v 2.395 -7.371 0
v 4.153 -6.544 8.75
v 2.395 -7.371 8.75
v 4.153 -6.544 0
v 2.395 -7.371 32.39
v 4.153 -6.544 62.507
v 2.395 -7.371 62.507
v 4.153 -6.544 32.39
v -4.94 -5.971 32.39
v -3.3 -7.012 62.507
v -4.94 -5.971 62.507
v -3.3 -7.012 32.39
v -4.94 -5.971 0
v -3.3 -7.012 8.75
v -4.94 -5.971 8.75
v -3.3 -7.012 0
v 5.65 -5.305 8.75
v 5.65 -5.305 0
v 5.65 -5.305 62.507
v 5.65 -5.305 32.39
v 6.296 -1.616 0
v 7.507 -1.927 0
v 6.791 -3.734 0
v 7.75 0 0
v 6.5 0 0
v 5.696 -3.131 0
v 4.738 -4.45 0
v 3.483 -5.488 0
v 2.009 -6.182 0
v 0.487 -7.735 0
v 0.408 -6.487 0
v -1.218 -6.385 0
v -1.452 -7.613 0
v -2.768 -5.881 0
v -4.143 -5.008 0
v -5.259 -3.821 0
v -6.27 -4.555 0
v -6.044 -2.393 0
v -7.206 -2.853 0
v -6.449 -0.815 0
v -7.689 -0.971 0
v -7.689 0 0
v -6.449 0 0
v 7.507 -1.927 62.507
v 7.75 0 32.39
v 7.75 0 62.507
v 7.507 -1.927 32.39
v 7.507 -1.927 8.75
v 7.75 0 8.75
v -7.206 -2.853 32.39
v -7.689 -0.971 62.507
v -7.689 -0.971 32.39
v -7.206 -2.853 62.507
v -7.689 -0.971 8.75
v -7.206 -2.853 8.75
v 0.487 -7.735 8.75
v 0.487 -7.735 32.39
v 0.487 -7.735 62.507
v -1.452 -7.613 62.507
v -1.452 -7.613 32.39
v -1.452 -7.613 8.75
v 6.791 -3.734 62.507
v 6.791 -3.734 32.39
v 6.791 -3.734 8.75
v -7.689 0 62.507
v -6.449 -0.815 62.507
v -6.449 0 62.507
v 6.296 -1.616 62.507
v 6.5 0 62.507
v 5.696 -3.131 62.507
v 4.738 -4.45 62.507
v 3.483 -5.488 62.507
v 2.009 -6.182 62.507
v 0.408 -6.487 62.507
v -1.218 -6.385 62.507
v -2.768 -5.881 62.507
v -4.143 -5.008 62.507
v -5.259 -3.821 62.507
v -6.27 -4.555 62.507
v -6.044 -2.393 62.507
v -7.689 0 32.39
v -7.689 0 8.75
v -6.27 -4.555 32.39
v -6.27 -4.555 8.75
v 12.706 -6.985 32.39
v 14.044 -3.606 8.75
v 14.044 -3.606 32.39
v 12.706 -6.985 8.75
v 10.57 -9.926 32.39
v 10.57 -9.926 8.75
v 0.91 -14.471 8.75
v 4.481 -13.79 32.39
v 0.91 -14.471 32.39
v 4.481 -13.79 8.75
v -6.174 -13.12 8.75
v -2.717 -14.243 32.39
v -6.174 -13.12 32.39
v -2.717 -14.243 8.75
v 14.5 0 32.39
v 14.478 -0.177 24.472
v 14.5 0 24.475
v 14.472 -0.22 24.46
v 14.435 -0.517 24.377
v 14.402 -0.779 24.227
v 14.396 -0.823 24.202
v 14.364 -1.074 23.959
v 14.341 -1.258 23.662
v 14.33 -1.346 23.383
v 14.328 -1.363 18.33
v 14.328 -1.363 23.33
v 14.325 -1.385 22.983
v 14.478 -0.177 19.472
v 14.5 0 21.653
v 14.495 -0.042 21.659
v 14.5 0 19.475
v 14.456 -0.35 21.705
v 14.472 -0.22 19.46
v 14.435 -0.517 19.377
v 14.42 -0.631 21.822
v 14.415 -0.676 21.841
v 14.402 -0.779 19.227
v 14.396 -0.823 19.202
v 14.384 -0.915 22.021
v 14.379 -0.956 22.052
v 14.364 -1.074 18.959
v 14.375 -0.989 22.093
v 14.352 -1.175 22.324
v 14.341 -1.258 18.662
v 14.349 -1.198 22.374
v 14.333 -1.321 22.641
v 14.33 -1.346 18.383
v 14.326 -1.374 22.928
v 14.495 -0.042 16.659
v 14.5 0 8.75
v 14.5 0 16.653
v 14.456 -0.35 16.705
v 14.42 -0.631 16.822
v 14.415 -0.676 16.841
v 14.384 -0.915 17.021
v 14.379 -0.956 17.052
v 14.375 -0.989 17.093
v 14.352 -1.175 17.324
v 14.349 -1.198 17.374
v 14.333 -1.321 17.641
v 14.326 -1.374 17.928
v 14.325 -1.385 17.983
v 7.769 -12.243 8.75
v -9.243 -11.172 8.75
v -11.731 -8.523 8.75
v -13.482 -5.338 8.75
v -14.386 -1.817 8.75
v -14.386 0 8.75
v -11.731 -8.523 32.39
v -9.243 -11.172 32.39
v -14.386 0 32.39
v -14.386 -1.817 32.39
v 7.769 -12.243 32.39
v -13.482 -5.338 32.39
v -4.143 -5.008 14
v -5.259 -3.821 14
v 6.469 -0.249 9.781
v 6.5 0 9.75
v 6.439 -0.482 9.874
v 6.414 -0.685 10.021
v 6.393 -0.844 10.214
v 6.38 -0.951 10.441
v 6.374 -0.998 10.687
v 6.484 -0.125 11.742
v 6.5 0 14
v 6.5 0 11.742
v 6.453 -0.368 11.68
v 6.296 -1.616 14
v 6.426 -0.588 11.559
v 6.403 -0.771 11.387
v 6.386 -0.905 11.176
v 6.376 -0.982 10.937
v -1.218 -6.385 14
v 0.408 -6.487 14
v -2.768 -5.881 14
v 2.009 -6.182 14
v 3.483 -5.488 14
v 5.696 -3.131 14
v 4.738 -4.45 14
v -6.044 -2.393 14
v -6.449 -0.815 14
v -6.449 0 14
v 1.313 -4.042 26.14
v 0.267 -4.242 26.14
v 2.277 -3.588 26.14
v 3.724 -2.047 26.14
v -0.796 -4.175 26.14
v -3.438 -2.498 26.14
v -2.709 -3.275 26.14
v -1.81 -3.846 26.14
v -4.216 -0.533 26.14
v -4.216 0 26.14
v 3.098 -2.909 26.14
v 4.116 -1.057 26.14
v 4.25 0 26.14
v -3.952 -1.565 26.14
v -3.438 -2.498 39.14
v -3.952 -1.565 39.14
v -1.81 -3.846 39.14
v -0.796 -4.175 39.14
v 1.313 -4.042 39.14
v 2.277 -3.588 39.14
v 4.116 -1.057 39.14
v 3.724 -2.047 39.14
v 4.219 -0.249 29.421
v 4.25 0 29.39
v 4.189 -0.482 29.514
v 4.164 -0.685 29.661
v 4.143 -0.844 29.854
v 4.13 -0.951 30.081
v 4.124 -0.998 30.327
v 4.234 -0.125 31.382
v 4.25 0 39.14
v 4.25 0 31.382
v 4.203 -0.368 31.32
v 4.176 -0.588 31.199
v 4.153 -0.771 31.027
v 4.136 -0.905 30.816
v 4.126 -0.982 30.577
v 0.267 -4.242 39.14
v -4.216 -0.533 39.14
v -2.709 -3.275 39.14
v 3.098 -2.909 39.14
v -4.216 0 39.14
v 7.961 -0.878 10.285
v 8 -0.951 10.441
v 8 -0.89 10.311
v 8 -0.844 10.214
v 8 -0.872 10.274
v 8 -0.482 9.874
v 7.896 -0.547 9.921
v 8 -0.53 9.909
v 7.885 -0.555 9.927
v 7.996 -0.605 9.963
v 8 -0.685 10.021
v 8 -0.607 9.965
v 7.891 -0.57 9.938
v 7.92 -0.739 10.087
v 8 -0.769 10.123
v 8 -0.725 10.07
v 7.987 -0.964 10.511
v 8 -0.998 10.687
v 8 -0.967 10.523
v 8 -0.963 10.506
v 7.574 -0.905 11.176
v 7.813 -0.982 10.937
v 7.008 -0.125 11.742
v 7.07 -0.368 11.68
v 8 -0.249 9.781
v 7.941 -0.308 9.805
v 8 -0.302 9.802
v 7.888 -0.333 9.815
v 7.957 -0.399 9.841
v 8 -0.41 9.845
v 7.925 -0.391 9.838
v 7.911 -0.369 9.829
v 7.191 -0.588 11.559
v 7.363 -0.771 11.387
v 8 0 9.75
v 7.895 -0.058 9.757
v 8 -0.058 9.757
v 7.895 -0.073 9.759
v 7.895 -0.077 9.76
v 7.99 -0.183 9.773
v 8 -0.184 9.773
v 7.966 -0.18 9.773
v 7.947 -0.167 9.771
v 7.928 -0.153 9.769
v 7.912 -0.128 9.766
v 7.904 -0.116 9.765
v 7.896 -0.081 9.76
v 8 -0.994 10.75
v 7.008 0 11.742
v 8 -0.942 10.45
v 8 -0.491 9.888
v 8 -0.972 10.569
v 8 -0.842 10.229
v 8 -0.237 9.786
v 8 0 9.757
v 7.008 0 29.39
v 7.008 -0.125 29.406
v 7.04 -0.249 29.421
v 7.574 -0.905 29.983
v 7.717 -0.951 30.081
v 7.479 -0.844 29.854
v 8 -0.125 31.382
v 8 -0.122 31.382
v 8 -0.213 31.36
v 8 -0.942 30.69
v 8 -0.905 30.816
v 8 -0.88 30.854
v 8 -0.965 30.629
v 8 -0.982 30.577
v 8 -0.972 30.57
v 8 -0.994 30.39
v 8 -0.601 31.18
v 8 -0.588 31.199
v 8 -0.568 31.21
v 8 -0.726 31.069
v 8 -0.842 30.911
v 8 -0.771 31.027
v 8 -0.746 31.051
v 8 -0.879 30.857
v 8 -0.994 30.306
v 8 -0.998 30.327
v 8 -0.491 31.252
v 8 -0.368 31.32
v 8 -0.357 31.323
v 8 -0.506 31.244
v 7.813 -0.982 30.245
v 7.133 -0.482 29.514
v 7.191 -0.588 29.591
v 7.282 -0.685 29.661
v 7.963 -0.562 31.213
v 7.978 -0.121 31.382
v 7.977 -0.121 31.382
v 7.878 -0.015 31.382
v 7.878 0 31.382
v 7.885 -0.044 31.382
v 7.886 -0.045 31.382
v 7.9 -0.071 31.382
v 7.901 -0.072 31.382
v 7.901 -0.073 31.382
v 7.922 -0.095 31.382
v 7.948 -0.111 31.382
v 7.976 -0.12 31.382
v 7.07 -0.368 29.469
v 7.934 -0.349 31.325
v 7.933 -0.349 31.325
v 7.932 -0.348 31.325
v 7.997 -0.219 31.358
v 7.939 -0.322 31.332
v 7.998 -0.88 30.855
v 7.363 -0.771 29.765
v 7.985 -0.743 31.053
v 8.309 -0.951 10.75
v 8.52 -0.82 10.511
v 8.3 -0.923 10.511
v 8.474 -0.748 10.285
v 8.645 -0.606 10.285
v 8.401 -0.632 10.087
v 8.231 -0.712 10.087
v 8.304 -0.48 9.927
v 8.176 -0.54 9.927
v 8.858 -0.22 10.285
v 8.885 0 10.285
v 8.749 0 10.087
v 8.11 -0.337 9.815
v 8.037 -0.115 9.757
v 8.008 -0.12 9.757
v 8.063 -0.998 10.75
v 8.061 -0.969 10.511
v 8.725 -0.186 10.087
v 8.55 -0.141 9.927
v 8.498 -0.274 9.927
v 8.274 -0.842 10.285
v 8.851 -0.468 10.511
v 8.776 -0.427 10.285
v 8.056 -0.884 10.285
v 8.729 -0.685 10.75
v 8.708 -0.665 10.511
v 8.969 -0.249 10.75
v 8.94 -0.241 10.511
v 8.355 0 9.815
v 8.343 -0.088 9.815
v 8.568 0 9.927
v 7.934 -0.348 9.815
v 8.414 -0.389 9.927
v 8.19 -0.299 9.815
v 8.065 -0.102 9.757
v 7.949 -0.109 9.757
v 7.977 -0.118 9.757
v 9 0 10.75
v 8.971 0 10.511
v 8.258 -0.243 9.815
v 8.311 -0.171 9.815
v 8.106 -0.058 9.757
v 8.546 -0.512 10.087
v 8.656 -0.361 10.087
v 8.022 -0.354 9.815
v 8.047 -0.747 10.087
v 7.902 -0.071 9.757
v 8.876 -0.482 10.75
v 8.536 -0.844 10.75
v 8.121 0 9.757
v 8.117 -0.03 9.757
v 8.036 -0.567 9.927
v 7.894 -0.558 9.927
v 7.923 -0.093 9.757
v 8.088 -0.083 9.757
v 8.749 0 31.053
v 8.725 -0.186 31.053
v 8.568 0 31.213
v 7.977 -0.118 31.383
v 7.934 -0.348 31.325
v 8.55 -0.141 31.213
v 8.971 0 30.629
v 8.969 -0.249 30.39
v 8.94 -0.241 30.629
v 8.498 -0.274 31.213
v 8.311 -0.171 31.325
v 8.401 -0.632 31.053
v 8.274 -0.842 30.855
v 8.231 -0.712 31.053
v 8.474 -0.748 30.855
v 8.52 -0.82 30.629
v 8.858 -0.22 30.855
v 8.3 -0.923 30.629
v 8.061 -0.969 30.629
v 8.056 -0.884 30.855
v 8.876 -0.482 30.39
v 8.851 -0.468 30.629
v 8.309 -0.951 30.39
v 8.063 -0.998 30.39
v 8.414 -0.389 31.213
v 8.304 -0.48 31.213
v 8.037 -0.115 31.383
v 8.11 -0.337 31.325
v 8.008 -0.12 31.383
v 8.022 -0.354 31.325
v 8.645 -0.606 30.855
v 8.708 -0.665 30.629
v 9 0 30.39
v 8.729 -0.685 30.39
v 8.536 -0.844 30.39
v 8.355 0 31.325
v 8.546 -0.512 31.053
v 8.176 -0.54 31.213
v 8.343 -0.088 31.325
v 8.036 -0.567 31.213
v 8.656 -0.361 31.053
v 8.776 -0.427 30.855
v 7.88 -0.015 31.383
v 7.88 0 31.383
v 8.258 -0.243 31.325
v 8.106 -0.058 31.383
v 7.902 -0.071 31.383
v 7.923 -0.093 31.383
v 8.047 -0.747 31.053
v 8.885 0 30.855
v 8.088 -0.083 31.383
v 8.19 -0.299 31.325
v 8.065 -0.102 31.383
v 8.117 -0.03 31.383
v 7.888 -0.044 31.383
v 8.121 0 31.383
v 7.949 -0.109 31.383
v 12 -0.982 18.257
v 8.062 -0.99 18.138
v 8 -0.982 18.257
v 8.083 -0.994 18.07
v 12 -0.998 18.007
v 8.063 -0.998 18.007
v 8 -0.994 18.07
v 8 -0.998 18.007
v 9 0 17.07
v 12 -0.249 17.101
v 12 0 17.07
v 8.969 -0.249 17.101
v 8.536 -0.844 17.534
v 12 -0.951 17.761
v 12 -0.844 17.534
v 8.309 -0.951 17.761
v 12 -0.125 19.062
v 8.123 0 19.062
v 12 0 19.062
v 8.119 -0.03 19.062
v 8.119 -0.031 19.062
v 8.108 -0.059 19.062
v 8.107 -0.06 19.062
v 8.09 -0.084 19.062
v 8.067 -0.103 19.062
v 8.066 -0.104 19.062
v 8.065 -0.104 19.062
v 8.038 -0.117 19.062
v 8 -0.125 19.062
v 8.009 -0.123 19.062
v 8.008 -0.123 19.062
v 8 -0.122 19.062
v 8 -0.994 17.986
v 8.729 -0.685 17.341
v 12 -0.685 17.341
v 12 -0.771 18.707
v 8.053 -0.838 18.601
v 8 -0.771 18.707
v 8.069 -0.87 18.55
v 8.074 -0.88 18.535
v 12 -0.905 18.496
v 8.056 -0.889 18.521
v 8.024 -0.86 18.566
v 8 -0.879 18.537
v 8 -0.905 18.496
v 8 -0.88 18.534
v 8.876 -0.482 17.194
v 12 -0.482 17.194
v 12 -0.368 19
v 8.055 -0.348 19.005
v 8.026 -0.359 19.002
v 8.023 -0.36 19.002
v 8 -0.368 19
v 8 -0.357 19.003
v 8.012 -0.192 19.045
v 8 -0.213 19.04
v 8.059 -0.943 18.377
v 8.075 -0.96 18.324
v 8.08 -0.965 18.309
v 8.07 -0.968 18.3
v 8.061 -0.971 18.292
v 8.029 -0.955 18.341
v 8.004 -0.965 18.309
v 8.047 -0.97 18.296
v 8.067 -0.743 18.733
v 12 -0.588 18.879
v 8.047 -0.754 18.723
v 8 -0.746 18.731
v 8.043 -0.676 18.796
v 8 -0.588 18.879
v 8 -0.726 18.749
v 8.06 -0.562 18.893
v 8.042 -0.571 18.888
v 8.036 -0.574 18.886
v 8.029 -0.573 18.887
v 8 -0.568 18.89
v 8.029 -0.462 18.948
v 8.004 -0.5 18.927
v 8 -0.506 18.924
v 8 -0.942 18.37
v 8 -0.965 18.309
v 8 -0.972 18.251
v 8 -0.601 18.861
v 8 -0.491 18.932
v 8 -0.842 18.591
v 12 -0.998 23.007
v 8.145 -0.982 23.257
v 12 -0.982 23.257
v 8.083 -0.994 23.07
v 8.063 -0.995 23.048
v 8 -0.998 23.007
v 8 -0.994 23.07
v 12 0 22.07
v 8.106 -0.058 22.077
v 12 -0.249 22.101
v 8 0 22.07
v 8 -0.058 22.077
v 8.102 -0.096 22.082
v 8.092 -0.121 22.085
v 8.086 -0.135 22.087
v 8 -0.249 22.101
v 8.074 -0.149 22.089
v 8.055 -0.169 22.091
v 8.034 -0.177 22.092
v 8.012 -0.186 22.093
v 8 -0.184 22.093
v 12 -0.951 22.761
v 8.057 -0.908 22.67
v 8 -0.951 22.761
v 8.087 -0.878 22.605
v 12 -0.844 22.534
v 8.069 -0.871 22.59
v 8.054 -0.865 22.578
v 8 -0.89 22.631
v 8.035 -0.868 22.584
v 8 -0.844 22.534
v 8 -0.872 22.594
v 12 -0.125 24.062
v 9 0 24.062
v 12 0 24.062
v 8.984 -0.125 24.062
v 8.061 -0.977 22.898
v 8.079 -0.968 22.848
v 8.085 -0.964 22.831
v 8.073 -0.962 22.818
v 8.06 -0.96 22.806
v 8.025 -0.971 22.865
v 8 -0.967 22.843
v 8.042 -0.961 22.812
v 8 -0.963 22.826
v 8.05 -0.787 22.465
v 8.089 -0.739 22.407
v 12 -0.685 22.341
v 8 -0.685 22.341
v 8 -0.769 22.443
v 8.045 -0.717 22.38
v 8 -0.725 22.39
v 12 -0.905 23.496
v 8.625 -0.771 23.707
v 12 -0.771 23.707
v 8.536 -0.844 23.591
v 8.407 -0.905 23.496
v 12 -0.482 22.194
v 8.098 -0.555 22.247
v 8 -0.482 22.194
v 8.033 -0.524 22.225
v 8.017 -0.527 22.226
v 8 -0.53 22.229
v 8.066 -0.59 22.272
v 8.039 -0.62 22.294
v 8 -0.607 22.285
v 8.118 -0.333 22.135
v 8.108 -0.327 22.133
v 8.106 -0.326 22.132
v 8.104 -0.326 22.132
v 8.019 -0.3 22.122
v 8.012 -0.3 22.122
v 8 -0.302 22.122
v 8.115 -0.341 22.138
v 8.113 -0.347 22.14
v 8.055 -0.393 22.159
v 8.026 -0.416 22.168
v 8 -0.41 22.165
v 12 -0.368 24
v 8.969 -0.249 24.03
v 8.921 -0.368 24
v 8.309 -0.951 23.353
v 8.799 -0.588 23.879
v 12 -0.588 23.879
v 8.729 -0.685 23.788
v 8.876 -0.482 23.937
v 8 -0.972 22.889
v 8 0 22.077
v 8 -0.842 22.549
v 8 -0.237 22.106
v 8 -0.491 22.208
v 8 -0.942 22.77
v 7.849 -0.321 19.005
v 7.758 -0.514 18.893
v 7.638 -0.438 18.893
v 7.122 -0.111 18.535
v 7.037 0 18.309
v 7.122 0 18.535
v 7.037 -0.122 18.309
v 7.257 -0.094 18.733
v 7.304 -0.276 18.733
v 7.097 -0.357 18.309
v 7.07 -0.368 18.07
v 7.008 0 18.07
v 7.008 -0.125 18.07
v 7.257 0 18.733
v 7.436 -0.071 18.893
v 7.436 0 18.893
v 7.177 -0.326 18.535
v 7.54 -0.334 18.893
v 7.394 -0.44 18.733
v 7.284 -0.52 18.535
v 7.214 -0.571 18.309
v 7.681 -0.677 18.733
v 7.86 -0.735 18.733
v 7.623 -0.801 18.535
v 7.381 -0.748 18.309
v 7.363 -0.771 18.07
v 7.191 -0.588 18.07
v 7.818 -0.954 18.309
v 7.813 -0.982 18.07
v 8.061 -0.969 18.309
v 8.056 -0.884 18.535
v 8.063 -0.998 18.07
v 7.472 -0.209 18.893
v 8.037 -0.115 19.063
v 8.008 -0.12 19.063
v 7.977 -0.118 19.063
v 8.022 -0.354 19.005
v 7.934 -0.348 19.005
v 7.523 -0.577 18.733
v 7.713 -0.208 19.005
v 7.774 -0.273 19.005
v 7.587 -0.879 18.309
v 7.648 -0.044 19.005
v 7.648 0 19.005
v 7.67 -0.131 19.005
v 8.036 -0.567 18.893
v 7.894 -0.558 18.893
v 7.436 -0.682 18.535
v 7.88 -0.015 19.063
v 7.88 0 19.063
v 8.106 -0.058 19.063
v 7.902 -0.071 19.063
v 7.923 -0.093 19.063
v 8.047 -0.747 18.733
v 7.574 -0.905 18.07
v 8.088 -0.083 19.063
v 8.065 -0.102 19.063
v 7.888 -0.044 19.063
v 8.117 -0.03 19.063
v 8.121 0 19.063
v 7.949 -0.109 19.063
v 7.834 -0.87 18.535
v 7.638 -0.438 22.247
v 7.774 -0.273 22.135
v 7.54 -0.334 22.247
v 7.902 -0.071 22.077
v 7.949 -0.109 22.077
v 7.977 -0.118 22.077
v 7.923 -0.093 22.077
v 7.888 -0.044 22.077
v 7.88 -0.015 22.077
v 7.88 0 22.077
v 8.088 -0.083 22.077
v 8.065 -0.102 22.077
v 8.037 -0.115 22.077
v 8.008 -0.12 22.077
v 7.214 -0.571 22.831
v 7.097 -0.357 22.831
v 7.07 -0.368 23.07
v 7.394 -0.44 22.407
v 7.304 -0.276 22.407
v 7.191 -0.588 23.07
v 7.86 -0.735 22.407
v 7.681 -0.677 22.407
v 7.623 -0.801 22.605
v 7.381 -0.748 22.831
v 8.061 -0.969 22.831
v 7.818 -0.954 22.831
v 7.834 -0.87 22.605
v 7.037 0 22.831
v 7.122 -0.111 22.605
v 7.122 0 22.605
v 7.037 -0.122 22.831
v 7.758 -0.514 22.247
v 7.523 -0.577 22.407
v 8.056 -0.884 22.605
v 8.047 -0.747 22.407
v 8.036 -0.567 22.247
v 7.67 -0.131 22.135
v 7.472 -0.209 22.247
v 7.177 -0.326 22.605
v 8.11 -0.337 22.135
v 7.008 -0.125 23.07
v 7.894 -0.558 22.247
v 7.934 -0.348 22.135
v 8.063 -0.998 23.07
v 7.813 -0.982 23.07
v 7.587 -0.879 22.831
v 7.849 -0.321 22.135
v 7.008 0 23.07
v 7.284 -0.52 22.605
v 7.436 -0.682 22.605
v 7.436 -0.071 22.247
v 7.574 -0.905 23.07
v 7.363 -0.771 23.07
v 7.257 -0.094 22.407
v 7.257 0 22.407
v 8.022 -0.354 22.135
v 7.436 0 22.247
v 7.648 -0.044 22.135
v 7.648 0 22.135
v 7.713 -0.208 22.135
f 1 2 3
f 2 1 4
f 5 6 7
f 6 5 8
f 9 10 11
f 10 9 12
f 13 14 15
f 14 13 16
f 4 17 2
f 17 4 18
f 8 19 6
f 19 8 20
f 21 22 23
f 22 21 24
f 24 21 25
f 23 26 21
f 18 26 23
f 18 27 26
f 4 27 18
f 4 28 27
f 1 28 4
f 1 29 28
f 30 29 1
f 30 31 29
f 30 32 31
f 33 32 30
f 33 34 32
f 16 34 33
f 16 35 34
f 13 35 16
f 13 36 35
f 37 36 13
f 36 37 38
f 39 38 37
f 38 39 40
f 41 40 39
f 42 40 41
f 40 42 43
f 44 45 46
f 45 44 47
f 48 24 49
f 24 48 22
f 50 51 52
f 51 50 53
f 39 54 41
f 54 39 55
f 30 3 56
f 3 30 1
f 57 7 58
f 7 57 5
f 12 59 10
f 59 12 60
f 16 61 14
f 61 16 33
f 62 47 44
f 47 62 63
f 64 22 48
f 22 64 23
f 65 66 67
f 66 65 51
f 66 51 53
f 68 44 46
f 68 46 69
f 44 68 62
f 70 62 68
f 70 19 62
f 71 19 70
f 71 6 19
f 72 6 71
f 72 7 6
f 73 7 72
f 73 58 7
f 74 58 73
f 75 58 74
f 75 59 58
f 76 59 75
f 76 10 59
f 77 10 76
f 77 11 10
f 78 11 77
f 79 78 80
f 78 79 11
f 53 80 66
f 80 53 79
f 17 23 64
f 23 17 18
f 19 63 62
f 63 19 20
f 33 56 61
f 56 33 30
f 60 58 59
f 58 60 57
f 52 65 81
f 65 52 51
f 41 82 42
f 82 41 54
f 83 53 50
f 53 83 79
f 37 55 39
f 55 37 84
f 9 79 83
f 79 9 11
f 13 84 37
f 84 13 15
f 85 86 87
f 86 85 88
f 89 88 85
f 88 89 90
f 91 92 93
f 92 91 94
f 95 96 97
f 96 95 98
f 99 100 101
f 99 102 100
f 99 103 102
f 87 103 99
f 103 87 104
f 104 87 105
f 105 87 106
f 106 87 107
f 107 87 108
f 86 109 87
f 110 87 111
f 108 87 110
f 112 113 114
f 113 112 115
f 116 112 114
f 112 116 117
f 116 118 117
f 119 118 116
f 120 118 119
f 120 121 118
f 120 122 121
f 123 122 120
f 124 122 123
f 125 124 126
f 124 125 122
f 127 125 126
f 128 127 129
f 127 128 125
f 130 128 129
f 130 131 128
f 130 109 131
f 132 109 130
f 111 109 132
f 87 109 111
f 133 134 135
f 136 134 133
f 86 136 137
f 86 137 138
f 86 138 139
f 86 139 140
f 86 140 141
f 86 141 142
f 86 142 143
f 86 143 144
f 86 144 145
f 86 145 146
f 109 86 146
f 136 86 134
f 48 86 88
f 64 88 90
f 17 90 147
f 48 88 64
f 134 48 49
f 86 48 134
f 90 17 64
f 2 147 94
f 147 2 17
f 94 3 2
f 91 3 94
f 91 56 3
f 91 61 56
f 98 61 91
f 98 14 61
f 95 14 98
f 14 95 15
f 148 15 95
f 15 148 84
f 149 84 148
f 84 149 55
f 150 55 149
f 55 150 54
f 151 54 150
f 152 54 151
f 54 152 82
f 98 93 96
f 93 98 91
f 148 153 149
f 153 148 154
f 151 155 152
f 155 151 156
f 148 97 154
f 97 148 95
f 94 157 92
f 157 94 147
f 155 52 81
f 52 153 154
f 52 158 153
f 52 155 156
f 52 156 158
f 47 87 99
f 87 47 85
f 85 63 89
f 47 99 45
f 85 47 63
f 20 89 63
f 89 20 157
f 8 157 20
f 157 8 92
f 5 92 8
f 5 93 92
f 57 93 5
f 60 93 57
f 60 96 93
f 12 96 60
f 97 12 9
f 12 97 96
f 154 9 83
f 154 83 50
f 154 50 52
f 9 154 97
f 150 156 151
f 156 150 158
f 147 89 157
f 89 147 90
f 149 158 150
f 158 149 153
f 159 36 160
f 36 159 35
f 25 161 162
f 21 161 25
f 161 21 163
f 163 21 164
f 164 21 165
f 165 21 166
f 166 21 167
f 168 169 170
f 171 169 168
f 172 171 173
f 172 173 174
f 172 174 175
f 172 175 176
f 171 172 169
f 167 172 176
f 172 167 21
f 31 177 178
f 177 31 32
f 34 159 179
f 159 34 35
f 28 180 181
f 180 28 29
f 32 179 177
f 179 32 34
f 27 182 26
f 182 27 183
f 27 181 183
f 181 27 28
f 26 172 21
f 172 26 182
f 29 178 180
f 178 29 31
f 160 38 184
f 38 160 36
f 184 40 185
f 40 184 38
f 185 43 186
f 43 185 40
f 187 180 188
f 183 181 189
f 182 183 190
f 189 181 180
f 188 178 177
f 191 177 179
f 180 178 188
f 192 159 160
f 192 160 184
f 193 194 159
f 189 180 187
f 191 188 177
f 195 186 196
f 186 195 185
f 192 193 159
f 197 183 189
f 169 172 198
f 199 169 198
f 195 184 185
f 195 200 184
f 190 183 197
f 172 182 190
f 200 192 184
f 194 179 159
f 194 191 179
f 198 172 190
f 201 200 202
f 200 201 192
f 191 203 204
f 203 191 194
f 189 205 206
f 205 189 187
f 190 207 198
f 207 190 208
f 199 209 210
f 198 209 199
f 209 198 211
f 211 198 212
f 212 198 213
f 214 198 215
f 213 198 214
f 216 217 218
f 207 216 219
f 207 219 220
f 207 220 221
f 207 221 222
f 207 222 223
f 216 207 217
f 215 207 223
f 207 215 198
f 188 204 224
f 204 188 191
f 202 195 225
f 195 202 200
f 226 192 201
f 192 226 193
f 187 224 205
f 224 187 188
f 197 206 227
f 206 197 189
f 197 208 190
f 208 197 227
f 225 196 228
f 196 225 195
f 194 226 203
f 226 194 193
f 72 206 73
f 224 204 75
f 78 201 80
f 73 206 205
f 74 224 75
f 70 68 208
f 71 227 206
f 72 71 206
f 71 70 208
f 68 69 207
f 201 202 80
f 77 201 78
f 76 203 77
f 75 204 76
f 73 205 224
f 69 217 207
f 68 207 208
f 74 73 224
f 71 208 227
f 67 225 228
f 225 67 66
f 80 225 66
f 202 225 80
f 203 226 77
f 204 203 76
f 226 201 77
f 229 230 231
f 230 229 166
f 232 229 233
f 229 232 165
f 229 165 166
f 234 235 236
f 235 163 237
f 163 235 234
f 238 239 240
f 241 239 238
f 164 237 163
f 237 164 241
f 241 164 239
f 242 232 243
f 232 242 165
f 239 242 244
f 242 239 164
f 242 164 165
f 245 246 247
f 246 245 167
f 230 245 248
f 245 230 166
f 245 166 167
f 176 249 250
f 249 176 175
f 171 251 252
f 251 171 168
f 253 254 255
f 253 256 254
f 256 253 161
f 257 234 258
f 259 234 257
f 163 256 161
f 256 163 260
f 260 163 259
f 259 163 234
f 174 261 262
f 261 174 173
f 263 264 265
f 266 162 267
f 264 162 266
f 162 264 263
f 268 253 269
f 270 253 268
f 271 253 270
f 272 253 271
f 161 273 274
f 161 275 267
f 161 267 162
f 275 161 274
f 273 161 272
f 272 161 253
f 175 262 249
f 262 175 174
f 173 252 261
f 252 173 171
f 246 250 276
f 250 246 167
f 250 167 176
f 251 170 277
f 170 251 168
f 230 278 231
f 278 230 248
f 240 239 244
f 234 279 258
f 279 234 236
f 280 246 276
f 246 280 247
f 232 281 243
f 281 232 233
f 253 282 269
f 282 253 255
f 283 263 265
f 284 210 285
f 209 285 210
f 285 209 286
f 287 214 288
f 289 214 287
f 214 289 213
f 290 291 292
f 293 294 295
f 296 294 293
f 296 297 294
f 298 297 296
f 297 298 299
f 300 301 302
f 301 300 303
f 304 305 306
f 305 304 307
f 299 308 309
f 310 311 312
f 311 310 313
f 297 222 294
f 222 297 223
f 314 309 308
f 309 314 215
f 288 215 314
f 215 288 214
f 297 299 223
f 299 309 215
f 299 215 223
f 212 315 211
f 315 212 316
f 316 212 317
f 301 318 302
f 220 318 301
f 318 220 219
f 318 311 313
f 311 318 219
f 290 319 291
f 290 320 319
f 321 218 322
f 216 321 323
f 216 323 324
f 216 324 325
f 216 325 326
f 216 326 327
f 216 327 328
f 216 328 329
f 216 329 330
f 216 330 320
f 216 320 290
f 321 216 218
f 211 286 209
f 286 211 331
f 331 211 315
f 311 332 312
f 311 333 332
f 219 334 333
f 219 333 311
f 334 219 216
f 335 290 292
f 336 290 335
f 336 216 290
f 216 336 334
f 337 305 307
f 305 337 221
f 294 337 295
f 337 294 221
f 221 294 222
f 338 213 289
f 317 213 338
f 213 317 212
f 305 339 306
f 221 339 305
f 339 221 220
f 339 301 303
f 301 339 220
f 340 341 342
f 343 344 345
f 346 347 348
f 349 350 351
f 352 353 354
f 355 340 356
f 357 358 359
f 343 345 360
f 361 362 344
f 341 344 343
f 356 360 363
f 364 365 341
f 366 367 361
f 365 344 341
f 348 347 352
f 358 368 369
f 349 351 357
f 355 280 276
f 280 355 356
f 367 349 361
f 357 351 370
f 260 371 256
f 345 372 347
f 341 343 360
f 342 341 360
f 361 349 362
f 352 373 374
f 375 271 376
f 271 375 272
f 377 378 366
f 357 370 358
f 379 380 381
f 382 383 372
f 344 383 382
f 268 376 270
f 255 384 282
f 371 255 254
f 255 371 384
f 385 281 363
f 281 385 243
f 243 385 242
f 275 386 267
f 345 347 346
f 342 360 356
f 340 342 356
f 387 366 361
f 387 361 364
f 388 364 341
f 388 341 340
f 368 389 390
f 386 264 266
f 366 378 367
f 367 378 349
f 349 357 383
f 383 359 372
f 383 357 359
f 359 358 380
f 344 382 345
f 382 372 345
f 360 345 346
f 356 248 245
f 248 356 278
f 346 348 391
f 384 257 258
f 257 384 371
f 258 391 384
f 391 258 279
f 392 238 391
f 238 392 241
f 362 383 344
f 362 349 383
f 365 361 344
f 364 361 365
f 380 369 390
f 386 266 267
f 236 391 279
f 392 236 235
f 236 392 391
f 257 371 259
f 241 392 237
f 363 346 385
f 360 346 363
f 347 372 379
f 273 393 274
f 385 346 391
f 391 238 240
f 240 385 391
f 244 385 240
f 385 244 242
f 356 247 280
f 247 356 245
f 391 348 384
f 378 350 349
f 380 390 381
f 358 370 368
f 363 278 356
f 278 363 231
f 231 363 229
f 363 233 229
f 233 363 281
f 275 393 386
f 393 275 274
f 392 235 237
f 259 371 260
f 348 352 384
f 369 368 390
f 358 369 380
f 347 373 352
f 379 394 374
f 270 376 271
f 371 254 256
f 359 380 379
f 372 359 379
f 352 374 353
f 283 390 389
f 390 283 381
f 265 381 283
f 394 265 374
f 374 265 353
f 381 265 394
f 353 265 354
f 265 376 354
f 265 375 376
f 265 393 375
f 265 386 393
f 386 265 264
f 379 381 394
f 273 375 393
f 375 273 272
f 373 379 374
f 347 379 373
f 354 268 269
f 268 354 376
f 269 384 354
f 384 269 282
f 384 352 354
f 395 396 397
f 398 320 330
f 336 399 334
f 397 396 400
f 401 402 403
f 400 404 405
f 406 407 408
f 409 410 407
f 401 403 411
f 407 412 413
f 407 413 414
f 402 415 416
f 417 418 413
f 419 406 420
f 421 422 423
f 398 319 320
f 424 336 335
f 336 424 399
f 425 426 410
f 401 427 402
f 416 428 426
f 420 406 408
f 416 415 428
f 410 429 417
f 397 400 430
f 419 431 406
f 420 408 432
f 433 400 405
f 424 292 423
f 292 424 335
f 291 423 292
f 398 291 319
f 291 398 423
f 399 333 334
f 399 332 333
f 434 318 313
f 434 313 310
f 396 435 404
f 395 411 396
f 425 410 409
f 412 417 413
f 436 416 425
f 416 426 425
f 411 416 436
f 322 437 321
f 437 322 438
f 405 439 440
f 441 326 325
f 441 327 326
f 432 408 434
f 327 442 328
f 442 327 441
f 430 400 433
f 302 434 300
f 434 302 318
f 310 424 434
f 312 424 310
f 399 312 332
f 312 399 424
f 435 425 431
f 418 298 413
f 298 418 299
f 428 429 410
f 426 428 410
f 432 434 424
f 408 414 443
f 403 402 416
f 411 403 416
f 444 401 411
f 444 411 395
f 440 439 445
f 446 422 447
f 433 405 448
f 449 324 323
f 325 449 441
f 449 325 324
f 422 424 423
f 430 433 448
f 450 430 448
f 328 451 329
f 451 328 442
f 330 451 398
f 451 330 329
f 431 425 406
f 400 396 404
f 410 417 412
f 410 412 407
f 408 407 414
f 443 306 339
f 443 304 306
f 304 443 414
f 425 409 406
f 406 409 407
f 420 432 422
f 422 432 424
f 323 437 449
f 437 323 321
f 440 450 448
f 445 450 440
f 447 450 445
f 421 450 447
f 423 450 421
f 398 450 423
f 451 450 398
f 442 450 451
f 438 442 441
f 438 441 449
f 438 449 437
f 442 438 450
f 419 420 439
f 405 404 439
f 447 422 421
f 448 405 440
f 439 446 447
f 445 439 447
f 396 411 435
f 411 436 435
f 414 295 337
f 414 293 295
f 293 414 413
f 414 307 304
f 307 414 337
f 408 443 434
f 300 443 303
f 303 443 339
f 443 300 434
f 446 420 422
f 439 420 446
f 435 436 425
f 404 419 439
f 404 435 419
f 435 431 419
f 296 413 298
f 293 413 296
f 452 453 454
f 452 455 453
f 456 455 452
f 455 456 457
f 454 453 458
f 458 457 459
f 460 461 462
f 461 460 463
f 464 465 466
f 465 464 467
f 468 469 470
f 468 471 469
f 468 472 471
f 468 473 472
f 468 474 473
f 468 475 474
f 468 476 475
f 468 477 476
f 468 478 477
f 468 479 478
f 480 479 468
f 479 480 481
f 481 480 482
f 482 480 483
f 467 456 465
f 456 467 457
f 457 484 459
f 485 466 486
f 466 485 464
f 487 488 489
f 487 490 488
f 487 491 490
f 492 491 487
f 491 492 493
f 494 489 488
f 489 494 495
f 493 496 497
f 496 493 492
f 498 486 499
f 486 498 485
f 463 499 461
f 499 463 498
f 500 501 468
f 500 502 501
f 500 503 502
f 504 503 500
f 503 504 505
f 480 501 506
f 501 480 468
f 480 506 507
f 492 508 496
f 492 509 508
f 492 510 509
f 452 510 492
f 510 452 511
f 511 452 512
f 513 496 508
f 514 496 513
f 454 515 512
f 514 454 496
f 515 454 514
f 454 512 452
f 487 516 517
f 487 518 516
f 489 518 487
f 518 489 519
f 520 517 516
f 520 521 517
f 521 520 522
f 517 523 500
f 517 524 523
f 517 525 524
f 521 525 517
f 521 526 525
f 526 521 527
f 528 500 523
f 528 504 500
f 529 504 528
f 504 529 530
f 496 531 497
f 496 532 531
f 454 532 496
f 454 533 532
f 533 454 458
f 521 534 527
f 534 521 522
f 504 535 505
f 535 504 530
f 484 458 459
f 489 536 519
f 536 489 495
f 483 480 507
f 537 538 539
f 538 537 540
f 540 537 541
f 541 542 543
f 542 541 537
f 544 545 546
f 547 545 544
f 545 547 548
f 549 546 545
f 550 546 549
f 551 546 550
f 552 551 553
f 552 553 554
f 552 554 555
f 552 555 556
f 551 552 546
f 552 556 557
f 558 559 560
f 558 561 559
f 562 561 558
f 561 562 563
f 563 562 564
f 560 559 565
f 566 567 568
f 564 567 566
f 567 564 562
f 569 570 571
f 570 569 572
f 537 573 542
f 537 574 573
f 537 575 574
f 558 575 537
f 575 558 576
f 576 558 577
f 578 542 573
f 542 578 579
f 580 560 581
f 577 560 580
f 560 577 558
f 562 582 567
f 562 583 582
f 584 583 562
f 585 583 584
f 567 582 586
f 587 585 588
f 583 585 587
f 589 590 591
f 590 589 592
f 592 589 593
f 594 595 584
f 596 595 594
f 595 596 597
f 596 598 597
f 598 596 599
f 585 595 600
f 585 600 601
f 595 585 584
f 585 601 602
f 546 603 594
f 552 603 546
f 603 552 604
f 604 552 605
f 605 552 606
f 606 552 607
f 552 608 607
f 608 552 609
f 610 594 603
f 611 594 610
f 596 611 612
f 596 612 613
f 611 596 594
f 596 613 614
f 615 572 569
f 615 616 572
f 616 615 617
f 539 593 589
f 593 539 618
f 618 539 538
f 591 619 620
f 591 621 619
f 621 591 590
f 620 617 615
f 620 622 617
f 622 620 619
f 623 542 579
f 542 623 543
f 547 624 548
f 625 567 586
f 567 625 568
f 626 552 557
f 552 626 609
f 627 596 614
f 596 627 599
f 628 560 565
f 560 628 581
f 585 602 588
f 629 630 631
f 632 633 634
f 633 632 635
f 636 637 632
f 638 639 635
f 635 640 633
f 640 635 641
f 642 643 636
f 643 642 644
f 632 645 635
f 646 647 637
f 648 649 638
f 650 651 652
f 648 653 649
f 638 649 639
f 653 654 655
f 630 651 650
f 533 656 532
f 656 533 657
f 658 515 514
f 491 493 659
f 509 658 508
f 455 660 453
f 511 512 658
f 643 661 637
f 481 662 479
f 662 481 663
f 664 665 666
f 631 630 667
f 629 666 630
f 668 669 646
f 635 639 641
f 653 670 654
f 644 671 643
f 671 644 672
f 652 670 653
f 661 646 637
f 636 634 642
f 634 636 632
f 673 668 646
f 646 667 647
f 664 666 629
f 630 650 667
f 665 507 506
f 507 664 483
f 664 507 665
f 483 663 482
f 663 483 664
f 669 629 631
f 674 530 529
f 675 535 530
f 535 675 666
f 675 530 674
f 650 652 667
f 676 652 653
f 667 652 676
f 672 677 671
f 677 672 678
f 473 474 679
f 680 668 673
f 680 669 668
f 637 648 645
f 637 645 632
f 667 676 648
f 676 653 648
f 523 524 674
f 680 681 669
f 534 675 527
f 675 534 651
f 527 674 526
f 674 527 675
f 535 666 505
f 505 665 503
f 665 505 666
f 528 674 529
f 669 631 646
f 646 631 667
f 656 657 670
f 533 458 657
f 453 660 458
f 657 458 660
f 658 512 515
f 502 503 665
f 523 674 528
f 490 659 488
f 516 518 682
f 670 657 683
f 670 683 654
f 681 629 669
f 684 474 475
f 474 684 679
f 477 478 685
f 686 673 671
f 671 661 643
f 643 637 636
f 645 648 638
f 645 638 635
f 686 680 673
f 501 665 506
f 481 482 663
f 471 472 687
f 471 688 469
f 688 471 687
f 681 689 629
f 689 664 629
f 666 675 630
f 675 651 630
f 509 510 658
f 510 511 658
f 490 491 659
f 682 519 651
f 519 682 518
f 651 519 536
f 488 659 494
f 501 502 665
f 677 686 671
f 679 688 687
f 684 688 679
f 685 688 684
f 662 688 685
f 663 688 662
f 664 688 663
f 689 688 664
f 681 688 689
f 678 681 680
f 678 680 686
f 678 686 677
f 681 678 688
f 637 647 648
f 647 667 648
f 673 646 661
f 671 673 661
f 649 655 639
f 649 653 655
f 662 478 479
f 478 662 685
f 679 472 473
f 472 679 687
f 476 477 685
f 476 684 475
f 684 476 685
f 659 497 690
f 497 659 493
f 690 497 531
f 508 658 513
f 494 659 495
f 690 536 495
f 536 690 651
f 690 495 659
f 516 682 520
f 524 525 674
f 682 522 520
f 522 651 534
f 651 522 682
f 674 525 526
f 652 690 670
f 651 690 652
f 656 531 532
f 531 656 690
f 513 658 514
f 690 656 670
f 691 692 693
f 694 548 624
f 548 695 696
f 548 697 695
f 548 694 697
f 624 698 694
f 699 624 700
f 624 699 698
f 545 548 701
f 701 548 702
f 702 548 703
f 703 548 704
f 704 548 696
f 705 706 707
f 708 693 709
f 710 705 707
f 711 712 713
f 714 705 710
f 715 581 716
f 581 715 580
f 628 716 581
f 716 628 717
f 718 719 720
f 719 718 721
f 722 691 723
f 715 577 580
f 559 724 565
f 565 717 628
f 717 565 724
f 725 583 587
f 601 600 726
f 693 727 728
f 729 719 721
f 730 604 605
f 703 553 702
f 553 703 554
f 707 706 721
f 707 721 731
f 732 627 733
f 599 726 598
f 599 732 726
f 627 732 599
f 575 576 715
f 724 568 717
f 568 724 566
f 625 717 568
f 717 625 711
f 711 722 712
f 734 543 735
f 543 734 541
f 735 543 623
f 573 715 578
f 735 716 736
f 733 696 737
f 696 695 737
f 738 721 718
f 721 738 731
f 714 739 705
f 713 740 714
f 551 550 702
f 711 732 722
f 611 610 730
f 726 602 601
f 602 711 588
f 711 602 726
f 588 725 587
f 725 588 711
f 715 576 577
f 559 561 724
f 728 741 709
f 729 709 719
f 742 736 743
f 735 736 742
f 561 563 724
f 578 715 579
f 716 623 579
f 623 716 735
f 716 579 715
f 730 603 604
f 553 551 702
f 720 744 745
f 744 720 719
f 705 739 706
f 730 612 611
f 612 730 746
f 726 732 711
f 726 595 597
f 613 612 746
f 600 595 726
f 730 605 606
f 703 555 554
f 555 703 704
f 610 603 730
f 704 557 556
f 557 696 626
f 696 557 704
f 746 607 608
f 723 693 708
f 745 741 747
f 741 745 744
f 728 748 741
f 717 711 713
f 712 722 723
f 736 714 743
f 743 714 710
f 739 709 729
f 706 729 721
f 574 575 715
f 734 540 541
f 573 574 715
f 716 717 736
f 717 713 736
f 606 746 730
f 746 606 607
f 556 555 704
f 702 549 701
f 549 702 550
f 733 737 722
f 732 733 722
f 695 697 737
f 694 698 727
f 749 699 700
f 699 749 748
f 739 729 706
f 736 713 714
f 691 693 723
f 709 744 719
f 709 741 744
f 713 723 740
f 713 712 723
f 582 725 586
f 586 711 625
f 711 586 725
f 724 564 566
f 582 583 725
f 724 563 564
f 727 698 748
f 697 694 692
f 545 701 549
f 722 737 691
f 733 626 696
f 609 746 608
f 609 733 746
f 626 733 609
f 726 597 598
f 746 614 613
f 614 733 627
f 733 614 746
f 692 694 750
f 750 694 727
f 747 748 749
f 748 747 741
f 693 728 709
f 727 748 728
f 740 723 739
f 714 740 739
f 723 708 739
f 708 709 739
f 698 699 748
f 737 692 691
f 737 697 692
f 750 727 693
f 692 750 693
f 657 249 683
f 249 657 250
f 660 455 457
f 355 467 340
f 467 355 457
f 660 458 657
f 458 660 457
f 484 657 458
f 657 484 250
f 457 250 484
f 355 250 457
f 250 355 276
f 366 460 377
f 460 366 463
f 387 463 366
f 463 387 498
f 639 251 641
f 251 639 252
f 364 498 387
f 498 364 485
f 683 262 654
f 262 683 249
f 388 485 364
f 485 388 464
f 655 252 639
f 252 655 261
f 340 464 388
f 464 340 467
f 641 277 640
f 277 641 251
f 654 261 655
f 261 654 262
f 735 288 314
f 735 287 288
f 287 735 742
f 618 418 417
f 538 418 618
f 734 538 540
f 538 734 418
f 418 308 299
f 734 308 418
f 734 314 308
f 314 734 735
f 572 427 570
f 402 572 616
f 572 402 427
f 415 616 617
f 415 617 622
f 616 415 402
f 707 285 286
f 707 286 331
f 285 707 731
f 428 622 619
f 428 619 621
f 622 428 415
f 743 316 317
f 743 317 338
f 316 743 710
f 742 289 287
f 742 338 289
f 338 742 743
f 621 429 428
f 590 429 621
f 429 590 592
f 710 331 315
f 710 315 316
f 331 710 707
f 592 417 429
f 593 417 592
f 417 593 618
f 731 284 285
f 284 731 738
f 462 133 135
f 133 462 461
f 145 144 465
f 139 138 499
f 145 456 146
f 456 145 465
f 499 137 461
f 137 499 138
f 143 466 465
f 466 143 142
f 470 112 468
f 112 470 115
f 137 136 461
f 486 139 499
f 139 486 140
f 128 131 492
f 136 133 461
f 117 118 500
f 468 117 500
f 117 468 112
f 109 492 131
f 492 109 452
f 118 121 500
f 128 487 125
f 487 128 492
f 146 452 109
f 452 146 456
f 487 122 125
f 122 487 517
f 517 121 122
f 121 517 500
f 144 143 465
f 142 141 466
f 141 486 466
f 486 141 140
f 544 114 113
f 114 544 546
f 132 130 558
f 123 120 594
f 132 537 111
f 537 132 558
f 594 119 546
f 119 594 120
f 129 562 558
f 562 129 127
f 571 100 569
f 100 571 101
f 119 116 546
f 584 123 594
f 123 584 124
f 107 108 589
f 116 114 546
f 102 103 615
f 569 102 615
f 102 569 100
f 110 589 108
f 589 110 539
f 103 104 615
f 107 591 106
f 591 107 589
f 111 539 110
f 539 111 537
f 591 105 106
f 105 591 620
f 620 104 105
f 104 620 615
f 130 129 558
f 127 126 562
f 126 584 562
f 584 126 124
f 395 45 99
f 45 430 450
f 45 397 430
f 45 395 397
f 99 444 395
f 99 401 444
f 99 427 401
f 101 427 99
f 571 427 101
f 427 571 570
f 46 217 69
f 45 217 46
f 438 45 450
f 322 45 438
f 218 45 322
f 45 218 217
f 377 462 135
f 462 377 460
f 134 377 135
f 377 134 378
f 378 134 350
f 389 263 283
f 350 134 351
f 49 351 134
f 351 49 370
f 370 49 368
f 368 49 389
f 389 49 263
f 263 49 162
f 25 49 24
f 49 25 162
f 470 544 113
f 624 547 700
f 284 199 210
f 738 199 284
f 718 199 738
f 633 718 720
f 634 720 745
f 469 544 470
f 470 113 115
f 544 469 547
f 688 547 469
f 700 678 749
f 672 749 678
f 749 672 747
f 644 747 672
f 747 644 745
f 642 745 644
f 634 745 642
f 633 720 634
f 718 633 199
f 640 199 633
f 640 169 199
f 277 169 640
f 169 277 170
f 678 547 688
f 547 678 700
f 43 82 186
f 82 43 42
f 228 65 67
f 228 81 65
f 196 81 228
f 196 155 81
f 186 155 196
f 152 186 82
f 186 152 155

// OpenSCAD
// this file by maehw/diy-beatmungsgeraet is licensed under the
// GNU General Public License v3.0

// disclaimer: this design is very experimental!

$fn = 25; // increase number to improve result (and to slow down rendering)

D = 13;
Li = 14; // Li >= D; length of the inlet
d = 8.5;
a1 = 21; // 21 +-1 degree
a2 = 11; // 7..15 degree
z = D/4;
x = d/2;

p = 1; // pipe system diameter
t = 2; // main flow tube system thickness (take care to include pipe diameters!)

// calculate part heights (lengths)
Lc = (D-d)/(2*tan(a1/2)); // calculate adjacent side
Lt = D; // +- 0.05*d
Ld = (D-d)/(2*tan(a2/2));
L = Li+Lc+Lt+Ld;

ypi = Li-z; // y coordinate of pipe inlet connection (towards sensor)
ypt = Li+Lc+x; // y coordinate of pipe throat connection (towards sensor)
xp = D/2 + 0.5 + p; // radius from inner of main tube to where the small pipes go towards the sensor
Lp = ypt - ypi; // length between the two pipe connections
Ls = 5; // sensor connection spacing
Lps = 4; // length of parallel horizontal pipes towards sensor

difference()
{
    difference()
    {
        // solid "outer" body
        union()
        {
            cylinder(L, d/2 + 0.5 + p + t, d/2 + 0.5 + p + t);

            translate([0,0,ypi-2*p]) cylinder(Lp+4*p, D/2 + 8, D/2 + 8);
        }

        union()
        {
            // main flow tube system
            union()
            {
                // cylindrical inlet
                cylinder(Li, D/2, D/2);

                // convergent entrance
                translate([0, 0, Li]) cylinder(Lc, D/2, d/2);

                // throat
                translate([0, 0, Li+Lc]) cylinder(Lt, d/2, d/2);

                // divergent outlet
                translate([0, 0, Li+Lc+Lt]) cylinder(Ld, d/2, D/2);
            }
            
            // add pipe system
            union()
            {
                // horizontal pipe connection in the inlet
                translate([0,0,ypi]) rotate([0,90,0]) cylinder(xp, p, p);
                // horizontal pipe connection in the throat
                translate([0,0,ypt]) rotate([0,90,0]) cylinder(xp, p, p);

                // make two smooth joints at the edges
                translate([xp,0,ypi]) sphere(p);
                translate([xp,0,ypt]) sphere(p);
                
                // horizontal lower pipe connection (from inlet) to the sensor
                translate([xp,0,ypi+(Lp-Ls)/2]) rotate([0,90,0]) cylinder(Lps, p, p);
                // horizontal upper pipe connection (from throat) to the sensor
                translate([xp,0,ypt-(Lp-Ls)/2]) rotate([0,90,0]) cylinder(Lps, p, p);

                // make two smooth joints at the edges
                translate([xp,0,ypi+(Lp-Ls)/2]) sphere(p);
                translate([xp,0,ypt-(Lp-Ls)/2]) sphere(p);
                
                // vertical pipe connections towards the sensor
                translate([xp,0,ypi]) cylinder((Lp-Ls)/2, p, p);
                translate([xp,0,ypt - (Lp-Ls)/2]) cylinder((Lp-Ls)/2, p, p);
                
                // horizontal lower pipe connection (from inlet) to the sensor
                translate([xp+Lps,0,ypi+(Lp-Ls)/2]) rotate([0,90,0]) cylinder(3, p, p+0.5);
                // horizontal upper pipe connection (from throat) to the sensor
                translate([xp+Lps,0,ypt-(Lp-Ls)/2]) rotate([0,90,0]) cylinder(3, p, p+0.5);
            }
        }
    }
    
    // subtract to have a look inside
    translate([-250,0,-1]) cube([500, 500, L+2]);
}
